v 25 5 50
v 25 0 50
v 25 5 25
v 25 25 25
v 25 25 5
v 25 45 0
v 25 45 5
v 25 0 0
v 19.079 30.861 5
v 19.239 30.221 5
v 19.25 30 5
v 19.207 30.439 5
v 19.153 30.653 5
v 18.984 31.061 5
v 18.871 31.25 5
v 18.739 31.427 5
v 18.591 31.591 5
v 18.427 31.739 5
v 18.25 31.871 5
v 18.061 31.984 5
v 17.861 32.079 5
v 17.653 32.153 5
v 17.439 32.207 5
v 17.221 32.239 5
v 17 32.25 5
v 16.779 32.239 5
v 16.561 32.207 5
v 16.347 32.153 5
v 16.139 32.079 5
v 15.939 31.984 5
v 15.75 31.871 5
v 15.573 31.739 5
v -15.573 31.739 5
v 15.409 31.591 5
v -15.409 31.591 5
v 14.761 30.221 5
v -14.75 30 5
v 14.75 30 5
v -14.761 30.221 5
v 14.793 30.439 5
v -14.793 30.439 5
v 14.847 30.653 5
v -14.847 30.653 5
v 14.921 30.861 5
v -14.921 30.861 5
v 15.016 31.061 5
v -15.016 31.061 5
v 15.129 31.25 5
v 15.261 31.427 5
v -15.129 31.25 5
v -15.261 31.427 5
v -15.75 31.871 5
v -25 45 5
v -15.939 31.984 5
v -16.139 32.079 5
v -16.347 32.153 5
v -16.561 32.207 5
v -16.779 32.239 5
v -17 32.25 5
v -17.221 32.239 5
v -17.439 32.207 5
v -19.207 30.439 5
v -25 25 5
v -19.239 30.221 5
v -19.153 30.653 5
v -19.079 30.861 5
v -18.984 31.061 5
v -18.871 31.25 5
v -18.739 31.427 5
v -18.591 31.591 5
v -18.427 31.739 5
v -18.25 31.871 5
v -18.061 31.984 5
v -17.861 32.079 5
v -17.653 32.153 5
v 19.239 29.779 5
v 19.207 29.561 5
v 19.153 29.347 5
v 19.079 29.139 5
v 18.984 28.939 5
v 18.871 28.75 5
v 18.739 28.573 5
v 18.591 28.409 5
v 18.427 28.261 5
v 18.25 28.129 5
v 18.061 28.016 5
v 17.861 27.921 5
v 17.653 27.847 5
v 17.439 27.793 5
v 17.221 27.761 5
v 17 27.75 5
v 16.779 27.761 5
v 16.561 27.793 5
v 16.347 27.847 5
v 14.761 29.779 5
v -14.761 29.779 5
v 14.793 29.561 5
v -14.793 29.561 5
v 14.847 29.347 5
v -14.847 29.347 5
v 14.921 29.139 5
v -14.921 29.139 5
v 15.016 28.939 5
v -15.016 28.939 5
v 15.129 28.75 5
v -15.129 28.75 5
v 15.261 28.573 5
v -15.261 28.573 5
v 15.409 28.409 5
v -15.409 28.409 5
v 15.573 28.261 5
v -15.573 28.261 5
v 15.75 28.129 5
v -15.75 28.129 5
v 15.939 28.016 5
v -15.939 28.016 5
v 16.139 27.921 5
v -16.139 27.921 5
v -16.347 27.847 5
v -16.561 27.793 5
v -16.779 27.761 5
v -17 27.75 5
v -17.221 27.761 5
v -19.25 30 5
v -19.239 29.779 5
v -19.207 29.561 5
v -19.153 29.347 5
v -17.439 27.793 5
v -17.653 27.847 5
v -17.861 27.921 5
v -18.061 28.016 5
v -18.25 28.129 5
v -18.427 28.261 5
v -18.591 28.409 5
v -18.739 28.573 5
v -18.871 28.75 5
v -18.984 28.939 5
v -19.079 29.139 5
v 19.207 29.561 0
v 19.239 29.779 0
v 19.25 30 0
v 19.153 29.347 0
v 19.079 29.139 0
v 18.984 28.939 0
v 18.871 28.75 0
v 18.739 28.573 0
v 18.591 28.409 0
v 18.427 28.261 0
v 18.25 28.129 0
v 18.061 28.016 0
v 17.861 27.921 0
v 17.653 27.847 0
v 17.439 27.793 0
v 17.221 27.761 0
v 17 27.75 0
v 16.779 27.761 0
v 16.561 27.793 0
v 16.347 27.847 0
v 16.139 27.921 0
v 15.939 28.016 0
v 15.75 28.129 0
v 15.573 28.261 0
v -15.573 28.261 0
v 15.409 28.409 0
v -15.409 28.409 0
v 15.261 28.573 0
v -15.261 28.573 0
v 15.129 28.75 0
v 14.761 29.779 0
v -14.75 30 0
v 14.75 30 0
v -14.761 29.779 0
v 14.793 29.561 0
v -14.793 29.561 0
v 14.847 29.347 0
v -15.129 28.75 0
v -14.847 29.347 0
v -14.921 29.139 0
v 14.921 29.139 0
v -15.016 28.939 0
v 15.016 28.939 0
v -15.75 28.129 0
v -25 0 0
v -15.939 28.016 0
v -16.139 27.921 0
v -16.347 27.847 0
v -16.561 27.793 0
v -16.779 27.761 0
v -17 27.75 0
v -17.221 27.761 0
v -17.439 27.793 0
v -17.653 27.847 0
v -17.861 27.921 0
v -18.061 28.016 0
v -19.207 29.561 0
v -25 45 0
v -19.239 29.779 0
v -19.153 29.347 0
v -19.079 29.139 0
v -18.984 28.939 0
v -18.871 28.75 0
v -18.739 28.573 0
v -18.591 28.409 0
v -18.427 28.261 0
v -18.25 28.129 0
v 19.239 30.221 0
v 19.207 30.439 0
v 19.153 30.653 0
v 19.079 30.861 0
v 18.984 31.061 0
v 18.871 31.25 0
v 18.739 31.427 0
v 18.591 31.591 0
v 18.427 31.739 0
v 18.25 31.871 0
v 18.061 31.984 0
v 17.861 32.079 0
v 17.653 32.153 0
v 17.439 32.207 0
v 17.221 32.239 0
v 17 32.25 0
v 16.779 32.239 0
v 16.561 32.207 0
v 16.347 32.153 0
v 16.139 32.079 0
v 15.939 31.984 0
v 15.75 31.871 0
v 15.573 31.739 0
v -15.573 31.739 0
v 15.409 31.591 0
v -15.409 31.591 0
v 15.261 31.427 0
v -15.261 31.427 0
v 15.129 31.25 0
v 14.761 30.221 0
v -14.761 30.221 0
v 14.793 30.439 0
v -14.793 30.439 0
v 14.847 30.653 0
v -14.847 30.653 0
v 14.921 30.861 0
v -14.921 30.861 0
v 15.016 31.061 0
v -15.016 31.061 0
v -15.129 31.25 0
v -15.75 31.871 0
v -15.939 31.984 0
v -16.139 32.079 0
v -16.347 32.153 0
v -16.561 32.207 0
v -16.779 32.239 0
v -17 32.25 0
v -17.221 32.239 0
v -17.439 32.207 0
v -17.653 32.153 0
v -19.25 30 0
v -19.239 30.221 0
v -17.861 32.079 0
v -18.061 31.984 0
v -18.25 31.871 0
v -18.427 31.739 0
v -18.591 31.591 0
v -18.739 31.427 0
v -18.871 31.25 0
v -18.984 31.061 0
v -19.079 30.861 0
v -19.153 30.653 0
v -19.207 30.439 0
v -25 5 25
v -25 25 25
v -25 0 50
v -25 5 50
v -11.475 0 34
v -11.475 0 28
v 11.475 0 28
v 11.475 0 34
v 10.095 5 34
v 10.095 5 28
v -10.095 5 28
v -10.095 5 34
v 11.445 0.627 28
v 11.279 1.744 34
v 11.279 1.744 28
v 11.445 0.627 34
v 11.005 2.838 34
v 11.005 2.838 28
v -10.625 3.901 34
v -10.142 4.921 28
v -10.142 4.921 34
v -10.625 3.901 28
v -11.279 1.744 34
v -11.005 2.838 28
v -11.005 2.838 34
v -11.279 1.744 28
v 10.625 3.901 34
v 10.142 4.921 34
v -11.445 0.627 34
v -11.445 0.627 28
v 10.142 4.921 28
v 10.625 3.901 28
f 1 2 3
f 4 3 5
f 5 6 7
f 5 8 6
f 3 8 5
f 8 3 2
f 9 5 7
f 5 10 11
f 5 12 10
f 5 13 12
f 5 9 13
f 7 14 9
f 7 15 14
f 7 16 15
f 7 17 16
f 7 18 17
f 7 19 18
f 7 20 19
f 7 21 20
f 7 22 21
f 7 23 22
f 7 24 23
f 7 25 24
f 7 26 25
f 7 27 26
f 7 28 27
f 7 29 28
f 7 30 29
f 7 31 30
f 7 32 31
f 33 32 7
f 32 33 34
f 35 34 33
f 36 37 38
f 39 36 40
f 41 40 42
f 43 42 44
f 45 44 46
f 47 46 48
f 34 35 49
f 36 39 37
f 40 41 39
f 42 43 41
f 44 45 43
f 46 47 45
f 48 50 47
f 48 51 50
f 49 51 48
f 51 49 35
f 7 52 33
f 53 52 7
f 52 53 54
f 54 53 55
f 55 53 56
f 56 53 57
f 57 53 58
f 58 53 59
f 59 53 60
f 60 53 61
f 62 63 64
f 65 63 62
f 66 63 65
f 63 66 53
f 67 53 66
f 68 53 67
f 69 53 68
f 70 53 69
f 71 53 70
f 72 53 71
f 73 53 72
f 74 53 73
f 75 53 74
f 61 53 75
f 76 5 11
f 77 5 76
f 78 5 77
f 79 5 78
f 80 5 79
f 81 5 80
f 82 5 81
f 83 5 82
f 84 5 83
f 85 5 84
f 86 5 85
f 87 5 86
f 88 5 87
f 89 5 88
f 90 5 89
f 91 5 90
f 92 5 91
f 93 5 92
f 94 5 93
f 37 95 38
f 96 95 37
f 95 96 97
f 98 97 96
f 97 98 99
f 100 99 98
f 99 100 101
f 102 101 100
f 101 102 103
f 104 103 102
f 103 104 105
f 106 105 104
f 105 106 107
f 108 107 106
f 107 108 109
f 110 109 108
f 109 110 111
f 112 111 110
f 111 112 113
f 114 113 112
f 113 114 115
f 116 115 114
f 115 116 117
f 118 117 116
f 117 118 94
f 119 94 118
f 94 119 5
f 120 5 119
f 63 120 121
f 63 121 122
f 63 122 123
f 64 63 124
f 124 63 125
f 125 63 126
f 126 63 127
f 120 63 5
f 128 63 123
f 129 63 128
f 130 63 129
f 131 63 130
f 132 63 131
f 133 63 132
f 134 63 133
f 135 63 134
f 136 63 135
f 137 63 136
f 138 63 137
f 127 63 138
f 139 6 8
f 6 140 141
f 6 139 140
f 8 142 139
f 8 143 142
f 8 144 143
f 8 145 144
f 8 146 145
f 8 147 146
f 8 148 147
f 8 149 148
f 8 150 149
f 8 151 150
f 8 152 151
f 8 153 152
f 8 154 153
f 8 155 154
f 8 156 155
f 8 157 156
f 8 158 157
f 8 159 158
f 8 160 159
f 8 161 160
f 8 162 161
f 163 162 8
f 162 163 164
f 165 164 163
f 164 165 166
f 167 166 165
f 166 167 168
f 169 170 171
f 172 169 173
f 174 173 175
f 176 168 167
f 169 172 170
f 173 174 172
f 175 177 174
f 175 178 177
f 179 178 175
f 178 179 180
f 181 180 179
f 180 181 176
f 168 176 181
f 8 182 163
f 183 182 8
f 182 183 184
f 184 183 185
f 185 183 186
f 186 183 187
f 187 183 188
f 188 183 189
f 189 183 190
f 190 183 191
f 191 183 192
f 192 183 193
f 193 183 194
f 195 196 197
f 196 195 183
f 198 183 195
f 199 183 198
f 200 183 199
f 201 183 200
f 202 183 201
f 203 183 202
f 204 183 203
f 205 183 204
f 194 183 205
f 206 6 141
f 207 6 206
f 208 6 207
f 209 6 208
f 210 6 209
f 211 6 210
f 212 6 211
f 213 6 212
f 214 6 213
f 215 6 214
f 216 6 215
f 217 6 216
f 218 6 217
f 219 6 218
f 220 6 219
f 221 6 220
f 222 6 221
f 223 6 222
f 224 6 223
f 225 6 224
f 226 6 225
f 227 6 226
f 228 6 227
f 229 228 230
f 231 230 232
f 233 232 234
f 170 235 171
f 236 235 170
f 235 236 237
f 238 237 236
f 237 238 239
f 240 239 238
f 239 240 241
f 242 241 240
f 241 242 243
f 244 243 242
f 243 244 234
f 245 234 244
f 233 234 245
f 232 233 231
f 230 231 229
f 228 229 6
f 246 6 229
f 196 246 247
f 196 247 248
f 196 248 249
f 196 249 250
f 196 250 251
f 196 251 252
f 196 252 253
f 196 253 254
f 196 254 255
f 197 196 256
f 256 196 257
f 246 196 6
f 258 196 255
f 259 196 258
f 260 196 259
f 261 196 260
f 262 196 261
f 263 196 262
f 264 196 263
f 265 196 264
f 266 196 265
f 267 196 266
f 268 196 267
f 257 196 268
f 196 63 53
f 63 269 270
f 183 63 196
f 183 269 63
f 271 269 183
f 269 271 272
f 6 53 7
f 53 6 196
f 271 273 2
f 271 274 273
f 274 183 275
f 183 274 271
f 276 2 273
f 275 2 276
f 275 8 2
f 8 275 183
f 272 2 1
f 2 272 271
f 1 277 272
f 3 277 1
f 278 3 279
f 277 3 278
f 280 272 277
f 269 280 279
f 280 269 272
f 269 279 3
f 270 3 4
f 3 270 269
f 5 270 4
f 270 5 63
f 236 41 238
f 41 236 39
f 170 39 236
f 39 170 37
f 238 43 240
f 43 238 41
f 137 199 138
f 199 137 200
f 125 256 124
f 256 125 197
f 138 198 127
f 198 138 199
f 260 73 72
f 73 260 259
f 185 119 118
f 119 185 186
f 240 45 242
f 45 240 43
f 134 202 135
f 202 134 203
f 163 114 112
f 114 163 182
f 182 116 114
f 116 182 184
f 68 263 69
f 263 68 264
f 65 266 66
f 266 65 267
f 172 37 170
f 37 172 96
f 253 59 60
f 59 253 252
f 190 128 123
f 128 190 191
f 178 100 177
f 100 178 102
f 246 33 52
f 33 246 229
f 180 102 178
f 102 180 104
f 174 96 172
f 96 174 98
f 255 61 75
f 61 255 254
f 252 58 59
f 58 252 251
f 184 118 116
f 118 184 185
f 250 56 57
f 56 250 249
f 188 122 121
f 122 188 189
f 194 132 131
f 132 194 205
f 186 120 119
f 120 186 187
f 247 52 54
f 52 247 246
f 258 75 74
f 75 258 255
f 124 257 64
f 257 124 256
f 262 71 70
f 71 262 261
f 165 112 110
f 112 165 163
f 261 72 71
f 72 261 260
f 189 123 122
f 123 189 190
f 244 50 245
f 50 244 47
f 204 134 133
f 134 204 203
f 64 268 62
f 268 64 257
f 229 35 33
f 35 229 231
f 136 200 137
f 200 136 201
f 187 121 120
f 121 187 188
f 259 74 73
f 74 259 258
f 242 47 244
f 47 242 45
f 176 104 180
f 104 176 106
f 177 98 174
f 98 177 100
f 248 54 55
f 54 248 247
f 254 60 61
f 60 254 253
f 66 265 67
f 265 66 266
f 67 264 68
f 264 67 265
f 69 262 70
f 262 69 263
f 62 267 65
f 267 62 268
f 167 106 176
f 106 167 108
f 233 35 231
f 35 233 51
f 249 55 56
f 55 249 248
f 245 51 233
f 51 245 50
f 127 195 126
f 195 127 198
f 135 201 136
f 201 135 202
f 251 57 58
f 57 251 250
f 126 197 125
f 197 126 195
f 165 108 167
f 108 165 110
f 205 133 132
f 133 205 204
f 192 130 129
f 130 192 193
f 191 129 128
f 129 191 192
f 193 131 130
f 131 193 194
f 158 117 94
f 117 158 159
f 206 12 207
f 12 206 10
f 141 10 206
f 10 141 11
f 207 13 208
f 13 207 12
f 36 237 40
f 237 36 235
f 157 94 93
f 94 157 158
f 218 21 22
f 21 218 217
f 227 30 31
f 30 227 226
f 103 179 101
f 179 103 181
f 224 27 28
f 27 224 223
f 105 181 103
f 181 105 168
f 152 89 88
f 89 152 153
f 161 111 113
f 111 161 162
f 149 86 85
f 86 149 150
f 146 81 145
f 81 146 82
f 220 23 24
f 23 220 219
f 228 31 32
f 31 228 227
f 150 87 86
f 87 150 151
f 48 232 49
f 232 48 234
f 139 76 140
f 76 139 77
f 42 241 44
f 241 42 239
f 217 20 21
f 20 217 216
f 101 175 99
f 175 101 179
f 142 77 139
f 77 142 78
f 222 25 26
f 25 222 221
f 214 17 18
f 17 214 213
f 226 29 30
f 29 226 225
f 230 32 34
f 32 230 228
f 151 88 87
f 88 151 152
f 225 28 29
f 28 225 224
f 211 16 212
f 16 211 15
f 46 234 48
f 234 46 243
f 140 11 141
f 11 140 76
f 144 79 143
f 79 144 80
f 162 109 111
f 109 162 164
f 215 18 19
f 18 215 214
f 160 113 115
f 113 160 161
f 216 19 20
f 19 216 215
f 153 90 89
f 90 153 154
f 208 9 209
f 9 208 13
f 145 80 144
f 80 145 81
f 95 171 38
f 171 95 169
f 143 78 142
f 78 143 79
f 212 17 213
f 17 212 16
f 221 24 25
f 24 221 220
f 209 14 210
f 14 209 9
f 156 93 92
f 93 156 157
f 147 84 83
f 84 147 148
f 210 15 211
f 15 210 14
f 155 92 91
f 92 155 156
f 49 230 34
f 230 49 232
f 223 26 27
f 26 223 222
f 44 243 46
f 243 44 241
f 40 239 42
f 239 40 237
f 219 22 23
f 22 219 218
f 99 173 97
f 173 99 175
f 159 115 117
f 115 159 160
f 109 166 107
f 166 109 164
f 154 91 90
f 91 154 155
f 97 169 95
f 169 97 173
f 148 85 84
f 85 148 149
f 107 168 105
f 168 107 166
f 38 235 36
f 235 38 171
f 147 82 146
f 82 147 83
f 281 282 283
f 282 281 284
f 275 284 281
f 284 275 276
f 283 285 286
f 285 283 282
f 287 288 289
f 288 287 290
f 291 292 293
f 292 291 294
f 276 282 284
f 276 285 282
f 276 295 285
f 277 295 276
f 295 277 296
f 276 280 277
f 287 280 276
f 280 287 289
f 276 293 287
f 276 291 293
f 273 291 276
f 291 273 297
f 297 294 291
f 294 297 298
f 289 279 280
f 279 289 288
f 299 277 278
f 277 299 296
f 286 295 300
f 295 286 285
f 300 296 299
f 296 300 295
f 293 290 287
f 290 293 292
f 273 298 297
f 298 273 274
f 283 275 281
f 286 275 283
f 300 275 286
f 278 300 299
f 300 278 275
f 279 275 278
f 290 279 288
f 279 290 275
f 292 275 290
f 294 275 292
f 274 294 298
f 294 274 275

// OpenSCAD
// L-shaped mounting bracket for NEMA 17 stepper motor (e.g. syringe pump)
// Print orientation: base plate on the bed (z = 0), vertical plate builds up in +Z

$fn = 64;

// ---------- Base plate ----------
base_x_min   = -25;   // base plate X start
base_x_max   = 25;    // base plate X end
base_y_min   = 0;     // base plate Y start
base_y_max   = 45;    // base plate Y end
base_thick   = 5;     // base plate thickness (Z)

// ---------- Vertical motor plate ----------
vert_y_min   = 0;     // motor plate Y start
vert_y_max   = 5;     // motor plate Y end
vert_height  = 50;    // motor plate height (Z)

// ---------- Boss hole ----------
boss_d       = 23;    // motor centring boss hole diameter
boss_x       = 0;     // boss hole X centre
boss_z       = 28;    // boss hole Z centre

// ---------- Screw holes ----------
screw_d      = 3.4;   // M3 screw hole diameter
screw_pitch  = 31;    // screw hole pattern pitch (square)

// ---------- Gussets ----------
gusset_x1    = -25;   // left gusset X start
gusset_x2    = -20;   // left gusset X end
gusset_y     = 20;    // gusset leg length along +Y
gusset_z     = 20;    // gusset leg length along +Z

// ---------- Through-holes (M4) ----------
hole_d       = 4.5;   // vertical through-hole diameter
hole_x       = [-17, 17]; // through-hole X positions
hole_y       = 30;    // through-hole Y position

// ---------- Cut overshoot ----------
eps          = 0.5;   // extension of cutters past faces

difference() {
    union() {
        // Base plate
        translate([base_x_min, base_y_min, 0])
            cube([base_x_max - base_x_min, base_y_max - base_y_min, base_thick]);

        // Vertical motor plate
        translate([base_x_min, vert_y_min, 0])
            cube([base_x_max - base_x_min, vert_y_max - vert_y_min, vert_height]);

        // Left gusset (right-angle corner at y = 5, z = 5)
        translate([gusset_x1, 5, 5])
            cube([gusset_x2 - gusset_x1, gusset_y, gusset_z]);

        // Right gusset (right-angle corner at y = 5, z = 5)
        translate([gusset_x2, 5, 5])
            cube([base_x_max - gusset_x2, gusset_y, gusset_z]);
    }

    // Vertical through-holes in base plate
    for (x = hole_x)
        translate([x, hole_y, -eps])
            cylinder(d = hole_d, h = base_thick + 2 * eps);

    // Boss hole along Y
    translate([boss_x, vert_y_min - eps, boss_z])
        cylinder(d = boss_d, h = (vert_y_max - vert_y_min) + 2 * eps);

    // M3 screw holes on square pattern centred on boss hole
    for (p = [-screw_pitch / 2, screw_pitch / 2])
        for (q = [-screw_pitch / 2, screw_pitch / 2])
            translate([boss_x + p, vert_y_min - eps + q, boss_z])
                cylinder(d = screw_d, h = (vert_y_max - vert_y_min) + 2 * eps);
}
